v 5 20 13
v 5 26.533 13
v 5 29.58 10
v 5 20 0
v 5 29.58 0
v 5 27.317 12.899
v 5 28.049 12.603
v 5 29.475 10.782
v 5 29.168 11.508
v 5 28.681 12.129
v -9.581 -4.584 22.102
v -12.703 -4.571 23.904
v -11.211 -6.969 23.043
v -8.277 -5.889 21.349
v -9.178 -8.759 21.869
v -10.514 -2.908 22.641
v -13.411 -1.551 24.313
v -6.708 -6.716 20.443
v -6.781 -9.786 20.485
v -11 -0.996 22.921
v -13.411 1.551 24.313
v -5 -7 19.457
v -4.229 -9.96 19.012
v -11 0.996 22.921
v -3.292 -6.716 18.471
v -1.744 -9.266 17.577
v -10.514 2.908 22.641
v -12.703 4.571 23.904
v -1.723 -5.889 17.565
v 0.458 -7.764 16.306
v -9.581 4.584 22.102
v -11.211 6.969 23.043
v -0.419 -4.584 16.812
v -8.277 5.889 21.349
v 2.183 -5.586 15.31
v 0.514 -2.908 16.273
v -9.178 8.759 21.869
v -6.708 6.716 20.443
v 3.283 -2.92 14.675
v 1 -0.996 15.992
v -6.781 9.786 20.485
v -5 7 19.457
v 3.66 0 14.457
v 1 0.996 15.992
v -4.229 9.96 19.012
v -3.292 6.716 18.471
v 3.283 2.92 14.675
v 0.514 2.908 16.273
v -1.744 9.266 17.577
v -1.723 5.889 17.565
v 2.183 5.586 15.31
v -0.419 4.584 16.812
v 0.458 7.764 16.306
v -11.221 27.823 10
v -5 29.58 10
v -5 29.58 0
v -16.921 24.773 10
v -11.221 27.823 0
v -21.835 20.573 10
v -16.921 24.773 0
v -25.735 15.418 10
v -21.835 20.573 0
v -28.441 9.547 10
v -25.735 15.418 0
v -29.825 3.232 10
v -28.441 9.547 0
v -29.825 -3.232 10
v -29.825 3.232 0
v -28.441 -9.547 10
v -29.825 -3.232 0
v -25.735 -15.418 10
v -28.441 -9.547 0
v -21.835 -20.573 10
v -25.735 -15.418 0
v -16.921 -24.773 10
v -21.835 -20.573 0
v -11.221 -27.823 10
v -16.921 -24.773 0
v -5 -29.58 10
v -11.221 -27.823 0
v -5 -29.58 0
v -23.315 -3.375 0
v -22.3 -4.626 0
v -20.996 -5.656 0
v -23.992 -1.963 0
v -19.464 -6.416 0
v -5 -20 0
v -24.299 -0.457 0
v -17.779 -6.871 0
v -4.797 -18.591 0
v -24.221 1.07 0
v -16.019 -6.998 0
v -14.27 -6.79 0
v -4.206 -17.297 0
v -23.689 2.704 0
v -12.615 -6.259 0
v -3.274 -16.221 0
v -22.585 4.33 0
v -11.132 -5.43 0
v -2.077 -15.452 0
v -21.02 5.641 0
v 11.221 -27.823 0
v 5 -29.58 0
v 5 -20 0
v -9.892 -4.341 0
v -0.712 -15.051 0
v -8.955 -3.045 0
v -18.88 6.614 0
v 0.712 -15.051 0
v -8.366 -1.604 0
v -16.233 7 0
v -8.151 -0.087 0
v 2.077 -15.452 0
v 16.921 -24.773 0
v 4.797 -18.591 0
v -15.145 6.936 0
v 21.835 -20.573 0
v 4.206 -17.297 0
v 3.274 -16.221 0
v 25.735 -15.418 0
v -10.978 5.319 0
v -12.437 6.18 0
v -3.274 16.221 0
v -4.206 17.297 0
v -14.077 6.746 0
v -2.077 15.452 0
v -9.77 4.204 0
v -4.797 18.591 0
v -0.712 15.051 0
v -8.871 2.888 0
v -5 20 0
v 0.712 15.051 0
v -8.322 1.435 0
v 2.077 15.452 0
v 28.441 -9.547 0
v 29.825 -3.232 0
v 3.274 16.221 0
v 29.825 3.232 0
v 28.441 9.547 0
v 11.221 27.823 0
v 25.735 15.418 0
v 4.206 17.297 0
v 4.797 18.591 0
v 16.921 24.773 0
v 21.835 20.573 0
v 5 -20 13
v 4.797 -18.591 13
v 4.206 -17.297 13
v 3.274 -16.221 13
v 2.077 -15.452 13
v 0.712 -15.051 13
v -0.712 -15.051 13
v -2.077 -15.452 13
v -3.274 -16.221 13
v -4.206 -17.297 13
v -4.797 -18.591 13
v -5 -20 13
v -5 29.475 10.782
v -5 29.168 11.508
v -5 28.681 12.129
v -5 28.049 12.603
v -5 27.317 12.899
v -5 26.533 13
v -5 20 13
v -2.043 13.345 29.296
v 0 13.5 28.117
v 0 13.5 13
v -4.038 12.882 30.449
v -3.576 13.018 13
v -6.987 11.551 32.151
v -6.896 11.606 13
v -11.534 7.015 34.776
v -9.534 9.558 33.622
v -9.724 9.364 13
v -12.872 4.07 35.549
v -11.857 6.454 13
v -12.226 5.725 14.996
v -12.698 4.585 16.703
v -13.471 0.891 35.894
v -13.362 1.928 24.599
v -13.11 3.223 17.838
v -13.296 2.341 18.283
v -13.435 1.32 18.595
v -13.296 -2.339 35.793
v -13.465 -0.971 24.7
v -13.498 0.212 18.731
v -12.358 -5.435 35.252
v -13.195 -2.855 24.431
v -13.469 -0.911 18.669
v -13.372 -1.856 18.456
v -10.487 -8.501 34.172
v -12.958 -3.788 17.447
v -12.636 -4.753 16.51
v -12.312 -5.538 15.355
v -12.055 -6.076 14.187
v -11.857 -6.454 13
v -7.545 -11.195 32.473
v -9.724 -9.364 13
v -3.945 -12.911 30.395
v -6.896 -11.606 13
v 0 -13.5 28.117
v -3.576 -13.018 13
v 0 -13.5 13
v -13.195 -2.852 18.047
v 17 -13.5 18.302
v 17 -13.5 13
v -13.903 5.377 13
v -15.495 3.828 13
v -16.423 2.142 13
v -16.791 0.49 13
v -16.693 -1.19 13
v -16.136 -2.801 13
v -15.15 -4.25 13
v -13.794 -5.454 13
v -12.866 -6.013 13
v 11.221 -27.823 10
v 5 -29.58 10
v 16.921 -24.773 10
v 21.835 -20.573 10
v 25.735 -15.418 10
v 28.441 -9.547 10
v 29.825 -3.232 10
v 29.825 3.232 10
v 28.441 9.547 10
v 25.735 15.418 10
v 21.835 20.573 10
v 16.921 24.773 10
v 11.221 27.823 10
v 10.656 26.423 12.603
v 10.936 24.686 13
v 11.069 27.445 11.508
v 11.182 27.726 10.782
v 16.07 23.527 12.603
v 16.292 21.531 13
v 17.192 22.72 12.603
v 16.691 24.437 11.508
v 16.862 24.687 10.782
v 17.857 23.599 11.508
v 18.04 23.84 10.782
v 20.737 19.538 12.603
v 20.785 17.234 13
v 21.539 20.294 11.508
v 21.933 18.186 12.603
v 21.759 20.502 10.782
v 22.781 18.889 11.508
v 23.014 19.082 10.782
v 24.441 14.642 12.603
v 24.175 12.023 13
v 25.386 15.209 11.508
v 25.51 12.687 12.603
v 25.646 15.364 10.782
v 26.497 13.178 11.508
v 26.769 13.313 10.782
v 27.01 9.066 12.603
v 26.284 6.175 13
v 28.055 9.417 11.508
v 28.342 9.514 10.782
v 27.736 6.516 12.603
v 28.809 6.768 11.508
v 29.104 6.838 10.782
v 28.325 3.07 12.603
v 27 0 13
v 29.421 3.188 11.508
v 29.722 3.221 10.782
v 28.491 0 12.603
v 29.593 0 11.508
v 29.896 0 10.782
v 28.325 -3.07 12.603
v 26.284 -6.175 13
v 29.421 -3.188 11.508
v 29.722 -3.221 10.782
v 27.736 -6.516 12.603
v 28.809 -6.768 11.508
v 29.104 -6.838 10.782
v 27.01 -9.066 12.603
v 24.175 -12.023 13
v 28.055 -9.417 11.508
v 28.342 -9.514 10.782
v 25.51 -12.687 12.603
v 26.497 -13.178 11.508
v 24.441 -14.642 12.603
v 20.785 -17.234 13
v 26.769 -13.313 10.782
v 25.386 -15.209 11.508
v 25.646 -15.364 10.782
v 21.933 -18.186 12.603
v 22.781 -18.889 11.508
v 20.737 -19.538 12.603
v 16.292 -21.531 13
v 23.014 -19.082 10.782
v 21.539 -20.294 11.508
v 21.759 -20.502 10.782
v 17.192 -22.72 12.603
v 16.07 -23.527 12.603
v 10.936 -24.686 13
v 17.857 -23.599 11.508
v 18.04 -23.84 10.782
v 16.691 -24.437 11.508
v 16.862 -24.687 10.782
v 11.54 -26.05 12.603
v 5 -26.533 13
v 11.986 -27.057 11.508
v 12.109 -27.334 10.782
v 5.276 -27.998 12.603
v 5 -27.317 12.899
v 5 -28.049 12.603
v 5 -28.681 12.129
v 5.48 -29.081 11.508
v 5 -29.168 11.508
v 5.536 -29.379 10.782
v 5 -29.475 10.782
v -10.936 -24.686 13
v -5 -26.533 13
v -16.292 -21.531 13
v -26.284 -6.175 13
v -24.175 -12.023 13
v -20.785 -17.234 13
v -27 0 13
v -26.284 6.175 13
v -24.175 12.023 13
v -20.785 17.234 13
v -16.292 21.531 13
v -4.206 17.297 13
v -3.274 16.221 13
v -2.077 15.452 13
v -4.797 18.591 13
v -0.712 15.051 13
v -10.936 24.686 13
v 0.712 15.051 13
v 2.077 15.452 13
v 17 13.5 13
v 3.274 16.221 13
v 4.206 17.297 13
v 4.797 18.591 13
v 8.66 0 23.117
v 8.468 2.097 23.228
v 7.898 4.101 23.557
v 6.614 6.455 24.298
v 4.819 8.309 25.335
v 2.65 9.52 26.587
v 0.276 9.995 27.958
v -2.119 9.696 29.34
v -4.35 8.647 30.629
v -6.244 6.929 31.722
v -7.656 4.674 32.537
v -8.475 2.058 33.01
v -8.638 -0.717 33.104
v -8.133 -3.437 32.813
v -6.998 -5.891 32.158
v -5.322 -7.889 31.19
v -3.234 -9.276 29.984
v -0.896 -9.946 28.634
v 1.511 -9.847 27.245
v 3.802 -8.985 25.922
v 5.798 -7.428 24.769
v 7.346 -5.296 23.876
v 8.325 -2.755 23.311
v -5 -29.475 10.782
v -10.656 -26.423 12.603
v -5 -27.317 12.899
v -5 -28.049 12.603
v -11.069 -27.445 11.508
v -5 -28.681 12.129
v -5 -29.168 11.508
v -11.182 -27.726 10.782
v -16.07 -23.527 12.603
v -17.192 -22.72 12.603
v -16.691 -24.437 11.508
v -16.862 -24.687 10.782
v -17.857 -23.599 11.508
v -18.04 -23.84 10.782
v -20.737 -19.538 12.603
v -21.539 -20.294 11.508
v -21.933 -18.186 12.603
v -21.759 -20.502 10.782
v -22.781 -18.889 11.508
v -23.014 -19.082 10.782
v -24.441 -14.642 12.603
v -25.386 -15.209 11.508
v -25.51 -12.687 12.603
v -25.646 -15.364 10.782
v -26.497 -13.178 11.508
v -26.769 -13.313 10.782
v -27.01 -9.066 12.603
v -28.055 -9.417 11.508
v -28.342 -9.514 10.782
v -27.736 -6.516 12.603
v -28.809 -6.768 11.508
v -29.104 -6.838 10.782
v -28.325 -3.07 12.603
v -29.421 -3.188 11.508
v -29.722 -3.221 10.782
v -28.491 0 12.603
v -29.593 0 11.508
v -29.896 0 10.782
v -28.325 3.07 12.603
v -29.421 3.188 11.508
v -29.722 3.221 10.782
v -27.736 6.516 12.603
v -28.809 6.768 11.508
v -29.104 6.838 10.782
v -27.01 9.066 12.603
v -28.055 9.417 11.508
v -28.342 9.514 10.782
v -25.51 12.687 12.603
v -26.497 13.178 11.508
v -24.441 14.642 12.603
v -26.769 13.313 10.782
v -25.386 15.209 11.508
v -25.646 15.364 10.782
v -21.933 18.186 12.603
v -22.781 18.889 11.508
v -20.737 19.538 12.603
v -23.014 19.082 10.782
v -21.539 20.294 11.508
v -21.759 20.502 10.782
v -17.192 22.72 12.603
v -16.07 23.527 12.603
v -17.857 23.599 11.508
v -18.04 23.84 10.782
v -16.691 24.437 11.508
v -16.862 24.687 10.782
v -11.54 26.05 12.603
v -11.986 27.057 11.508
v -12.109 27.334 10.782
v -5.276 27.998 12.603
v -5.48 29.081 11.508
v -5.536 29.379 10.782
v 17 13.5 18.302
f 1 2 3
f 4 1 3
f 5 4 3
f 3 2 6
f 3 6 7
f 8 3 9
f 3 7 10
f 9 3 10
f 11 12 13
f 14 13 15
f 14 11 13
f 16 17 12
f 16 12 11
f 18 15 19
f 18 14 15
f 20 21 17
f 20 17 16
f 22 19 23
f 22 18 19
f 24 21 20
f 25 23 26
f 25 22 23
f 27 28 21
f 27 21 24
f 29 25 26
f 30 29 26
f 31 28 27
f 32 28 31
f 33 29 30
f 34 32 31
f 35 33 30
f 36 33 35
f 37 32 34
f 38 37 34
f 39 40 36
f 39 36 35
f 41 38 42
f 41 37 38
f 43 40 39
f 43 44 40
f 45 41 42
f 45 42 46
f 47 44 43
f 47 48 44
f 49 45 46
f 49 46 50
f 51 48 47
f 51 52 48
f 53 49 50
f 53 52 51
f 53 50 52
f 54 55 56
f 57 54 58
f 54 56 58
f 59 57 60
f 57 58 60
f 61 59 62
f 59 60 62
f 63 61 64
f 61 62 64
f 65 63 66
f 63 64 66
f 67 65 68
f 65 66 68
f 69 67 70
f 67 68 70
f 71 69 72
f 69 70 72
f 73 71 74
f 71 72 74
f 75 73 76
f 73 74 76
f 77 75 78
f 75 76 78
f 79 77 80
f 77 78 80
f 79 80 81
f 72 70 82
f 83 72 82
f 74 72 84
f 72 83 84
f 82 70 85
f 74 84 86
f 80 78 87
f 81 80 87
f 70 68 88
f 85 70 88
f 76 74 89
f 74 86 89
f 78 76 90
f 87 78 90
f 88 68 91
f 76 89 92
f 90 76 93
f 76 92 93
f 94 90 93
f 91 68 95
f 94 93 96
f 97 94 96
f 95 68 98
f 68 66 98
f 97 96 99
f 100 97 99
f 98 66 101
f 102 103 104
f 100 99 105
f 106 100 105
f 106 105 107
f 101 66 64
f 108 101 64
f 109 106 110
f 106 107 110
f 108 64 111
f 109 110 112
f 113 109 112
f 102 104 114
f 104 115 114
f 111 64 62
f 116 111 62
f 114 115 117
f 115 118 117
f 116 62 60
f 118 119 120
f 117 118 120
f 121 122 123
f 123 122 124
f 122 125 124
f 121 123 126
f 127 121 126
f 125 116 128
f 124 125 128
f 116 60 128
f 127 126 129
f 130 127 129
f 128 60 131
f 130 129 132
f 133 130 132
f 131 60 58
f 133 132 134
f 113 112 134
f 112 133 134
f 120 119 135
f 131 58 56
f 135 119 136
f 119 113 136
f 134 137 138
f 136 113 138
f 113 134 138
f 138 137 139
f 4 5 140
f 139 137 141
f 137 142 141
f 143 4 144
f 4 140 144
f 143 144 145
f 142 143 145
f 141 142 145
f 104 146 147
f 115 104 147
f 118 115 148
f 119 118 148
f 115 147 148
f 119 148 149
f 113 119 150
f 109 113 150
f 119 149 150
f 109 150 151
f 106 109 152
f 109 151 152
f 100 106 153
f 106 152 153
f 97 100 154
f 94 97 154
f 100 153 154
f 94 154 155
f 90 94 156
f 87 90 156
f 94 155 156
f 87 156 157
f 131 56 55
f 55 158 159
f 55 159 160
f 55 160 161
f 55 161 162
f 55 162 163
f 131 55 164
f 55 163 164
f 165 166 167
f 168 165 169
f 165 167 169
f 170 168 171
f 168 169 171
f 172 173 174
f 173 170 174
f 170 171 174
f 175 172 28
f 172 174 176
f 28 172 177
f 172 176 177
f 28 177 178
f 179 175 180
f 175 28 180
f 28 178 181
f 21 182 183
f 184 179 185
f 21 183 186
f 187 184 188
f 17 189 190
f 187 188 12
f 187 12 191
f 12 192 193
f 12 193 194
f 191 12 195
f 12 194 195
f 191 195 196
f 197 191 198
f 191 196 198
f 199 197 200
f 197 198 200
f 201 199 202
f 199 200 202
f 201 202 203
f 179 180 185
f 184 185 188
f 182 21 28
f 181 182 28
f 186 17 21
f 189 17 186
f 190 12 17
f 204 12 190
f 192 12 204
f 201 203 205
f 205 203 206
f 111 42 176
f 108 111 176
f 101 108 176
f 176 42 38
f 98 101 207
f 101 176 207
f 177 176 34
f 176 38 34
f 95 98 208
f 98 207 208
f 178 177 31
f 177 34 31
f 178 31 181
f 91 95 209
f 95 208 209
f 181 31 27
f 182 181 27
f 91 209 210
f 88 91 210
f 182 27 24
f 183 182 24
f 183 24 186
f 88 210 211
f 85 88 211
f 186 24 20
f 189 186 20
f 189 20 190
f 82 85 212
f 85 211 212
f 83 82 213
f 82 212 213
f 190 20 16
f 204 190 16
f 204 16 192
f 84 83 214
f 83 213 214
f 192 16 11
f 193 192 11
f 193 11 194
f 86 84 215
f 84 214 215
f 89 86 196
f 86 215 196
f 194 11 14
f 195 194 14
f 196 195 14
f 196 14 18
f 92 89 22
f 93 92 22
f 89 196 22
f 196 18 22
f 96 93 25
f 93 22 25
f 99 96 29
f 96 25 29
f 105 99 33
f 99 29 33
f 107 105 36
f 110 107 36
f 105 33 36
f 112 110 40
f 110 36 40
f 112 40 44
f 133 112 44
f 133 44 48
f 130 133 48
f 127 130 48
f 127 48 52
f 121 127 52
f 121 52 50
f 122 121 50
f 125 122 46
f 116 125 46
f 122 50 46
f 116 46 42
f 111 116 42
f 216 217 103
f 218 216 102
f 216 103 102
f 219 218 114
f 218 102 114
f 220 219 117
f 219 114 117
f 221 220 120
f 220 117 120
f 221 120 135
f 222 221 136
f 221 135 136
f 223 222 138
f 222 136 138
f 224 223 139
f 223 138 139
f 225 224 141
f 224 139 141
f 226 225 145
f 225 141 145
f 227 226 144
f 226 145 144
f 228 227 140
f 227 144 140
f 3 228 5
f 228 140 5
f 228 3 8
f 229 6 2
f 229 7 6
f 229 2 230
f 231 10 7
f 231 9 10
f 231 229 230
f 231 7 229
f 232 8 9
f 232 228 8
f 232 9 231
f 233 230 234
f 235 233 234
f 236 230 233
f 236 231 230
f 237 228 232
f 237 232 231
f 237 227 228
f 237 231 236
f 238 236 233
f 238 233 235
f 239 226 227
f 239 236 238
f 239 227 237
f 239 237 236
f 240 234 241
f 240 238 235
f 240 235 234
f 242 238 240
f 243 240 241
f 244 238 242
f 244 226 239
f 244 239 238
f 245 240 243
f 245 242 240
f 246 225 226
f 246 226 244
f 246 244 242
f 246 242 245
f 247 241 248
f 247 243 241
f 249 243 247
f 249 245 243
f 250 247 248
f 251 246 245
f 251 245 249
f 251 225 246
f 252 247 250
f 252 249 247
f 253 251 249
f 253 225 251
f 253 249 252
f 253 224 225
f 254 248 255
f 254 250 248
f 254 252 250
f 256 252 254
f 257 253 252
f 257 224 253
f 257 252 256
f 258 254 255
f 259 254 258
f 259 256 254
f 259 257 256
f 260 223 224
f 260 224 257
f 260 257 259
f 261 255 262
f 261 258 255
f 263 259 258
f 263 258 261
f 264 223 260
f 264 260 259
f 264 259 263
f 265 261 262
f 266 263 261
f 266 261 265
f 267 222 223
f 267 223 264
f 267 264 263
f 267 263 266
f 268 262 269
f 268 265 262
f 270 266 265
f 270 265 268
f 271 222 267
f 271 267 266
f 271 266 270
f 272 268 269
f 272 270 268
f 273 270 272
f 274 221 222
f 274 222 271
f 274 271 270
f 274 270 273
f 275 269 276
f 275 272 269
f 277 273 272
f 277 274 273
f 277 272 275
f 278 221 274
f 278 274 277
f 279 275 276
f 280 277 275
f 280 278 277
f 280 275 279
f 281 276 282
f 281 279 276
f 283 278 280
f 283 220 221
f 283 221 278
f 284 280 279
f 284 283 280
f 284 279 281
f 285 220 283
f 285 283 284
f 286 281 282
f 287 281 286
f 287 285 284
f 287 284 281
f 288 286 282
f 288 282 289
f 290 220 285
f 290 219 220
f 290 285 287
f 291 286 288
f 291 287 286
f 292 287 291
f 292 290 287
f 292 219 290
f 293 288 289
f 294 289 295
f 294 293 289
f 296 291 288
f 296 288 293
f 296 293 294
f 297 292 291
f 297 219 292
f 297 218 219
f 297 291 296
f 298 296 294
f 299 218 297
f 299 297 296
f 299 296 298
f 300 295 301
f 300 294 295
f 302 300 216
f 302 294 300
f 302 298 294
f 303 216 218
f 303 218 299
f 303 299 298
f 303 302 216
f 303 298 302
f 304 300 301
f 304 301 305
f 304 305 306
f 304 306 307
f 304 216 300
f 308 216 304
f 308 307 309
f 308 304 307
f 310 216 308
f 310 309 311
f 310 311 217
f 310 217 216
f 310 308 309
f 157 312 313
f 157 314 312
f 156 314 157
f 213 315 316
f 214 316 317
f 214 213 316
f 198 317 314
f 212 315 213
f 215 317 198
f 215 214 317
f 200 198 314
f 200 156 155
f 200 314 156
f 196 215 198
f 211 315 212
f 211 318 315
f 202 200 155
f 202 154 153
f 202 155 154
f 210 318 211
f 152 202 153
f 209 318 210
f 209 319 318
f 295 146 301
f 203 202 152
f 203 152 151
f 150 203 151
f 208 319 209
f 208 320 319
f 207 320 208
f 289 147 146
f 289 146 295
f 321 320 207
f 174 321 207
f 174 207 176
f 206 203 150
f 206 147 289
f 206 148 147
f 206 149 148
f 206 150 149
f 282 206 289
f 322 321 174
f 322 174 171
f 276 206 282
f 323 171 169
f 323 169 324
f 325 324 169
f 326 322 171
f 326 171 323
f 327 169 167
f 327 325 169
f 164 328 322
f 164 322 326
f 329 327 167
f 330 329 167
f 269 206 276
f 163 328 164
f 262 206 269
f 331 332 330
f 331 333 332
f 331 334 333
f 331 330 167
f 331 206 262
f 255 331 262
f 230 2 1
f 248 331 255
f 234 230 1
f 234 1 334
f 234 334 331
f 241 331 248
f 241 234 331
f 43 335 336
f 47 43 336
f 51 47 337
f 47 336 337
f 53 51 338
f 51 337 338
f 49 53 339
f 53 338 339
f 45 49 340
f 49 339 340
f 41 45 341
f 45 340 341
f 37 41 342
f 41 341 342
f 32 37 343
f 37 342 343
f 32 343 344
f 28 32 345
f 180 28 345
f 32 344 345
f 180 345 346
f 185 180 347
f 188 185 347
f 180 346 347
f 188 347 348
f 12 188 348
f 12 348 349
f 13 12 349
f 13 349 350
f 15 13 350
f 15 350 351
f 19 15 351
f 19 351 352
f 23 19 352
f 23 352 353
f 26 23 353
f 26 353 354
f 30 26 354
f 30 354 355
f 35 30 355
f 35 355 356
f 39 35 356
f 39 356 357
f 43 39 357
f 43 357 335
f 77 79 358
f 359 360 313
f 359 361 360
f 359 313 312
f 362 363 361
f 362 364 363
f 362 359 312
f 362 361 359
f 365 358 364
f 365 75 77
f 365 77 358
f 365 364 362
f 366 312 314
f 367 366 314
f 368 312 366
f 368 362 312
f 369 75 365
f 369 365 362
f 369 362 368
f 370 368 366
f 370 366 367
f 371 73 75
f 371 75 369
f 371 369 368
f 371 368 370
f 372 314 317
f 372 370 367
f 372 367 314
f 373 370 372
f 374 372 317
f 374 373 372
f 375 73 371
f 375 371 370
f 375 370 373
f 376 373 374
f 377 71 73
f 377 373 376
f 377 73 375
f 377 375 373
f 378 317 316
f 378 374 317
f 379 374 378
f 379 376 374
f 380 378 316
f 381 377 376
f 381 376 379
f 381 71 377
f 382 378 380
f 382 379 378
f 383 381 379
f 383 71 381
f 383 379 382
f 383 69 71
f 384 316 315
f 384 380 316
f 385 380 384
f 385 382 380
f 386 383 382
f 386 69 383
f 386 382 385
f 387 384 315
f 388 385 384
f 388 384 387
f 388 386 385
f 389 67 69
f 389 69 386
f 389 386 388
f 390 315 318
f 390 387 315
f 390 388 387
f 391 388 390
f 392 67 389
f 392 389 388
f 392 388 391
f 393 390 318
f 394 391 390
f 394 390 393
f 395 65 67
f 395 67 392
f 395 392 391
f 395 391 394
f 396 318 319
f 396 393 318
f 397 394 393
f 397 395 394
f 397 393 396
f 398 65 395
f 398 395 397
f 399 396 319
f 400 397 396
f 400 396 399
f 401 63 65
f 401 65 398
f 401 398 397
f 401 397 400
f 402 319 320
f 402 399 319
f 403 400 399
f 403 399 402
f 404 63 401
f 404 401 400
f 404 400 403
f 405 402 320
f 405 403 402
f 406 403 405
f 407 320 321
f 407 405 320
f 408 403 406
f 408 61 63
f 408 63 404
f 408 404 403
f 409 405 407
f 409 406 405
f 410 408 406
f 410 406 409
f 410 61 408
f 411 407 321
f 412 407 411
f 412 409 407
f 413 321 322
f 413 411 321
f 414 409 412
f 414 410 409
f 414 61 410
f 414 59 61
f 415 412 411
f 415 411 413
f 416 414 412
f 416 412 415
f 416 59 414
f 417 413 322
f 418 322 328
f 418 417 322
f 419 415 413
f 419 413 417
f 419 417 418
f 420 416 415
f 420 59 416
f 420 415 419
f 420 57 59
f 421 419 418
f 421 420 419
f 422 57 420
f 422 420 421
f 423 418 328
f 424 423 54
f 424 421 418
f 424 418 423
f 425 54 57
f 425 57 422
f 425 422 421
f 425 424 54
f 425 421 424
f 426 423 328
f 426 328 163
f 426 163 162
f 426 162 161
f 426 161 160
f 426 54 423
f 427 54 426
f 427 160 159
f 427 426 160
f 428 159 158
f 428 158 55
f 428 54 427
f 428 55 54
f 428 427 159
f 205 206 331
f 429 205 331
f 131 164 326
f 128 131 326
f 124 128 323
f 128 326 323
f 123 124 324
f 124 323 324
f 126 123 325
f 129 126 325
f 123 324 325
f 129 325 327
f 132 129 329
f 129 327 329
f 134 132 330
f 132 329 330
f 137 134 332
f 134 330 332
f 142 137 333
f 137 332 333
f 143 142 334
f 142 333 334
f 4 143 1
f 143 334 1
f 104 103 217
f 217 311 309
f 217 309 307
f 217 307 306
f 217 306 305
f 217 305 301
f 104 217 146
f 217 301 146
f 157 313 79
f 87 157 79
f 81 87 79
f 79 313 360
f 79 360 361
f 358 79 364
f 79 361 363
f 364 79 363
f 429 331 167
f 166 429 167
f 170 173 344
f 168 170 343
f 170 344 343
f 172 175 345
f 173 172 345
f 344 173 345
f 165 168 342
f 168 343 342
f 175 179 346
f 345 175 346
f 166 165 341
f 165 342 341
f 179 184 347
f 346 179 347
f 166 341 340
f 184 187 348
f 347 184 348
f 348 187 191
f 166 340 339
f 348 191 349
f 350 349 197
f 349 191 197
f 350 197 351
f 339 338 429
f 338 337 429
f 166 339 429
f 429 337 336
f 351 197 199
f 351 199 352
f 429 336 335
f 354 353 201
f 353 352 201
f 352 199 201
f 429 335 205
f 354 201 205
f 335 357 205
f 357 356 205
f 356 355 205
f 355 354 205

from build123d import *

# Parameters (mm, degrees)
F0_R       = 30
F1_DEPTH   = 13
F3_DEPTH   = 25
F5_DEPTH   = 25
F7_DEPTH   = 25
F9_DEPTH   = 25
F10_R      = 10
F10_R_2    = 7
F11_DEPTH  = 10
F11_FACE_R = 7
F12_DEPTH  = 39.351137
F13_R      = 3
F14_R      = 3


with BuildPart() as f1:
    # F0 (on Top) → F1 (new body)
    with BuildSketch(Plane.XY):
        Circle(F0_R)
    extrude(amount=F1_DEPTH)

    # F2 (on face) → F3 (cut)
    with BuildSketch(Plane.XY.offset(13)):
        with BuildLine():
            Line((5, -29.580399), (5, -20))
            ThreePointArc((5, -20), (0, -25), (-5, -20))
            Line((-5, -20), (-5, -29.580399))
            ThreePointArc((-5, -29.580399), (0, -30), (5, -29.580399))
        make_face()
        with BuildLine():
            ThreePointArc((-5, -20), (0, -25), (5, -20))
            ThreePointArc((5, -20), (0, -15), (-5, -20))
        make_face()
    extrude(amount=-F3_DEPTH, mode=Mode.SUBTRACT)

    # F4 (on face) → F5 (cut)
    with BuildSketch(Plane.XY.offset(13)):
        with BuildLine():
            ThreePointArc((-5, 20), (0, 15), (5, 20))
            ThreePointArc((5, 20), (0, 25), (-5, 20))
        make_face()
        with BuildLine():
            ThreePointArc((-5, 20), (0, 25), (5, 20))
            Line((5, 20), (5, 29.580399))
            ThreePointArc((5, 29.580399), (0, 30), (-5, 29.580399))
            Line((-5, 29.580399), (-5, 20))
        make_face()
    extrude(amount=-F5_DEPTH, mode=Mode.SUBTRACT)

    # F6 (on face) → F7 (join)
    with BuildSketch(Plane.XY.offset(13)):
        with BuildLine():
            ThreePointArc((0, -13.5), (9.545942, -9.545942), (13.5, 0))
            ThreePointArc((13.5, 0), (9.545942, 9.545942), (0, 13.5))
            ThreePointArc((0, 13.5), (-13.5, 0), (0, -13.5))
        make_face()
        with BuildLine():
            ThreePointArc((0, 13.5), (9.545942, 9.545942), (13.5, 0))
            ThreePointArc((13.5, 0), (9.545942, -9.545942), (0, -13.5))
            Line((0, -13.5), (17, -13.5))
            Line((17, -13.5), (17, 13.5))
            Line((17, 13.5), (0, 13.5))
        make_face()
    extrude(amount=F7_DEPTH)

    # F8 (on Front) → F9 (cut, symmetric)
    with BuildSketch(Plane.XZ):
        Polygon((-14.918525, 36.73033), (17, 18.302161), (17, 39.234225), (-14.918525, 39.234225), align=None)
    extrude(amount=F9_DEPTH, both=True, mode=Mode.SUBTRACT)

    # F10 (on face) → F11 (cut)
    with BuildSketch(Plane(origin=(12.175068, 0, 21.087837), x_dir=(0.866025, 0, -0.5), z_dir=(0.5, 0, 0.866025))):
        with Locations((-14.058558, 0)):
            Circle(F10_R)
        with Locations((-14.058558, 0)):
            Circle(F10_R_2, mode=Mode.SUBTRACT)
    extrude(amount=-F11_DEPTH, mode=Mode.SUBTRACT)

    # F11_face (on face) → F12 (cut, through all)
    with BuildSketch(Plane(origin=(0, 0, 28.117116), x_dir=(0, 1, 0), z_dir=(0.5, 0, 0.866025))):
        Circle(F11_FACE_R)
    extrude(amount=-F12_DEPTH, mode=Mode.SUBTRACT)

    # F13
    f13_edges = [f1.edges().sort_by_distance(p)[0] for p in [
        (-30, 0, 13),
    ]]
    fillet(f13_edges, radius=F13_R)

    # F14
    f14_edges = [f1.edges().sort_by_distance(p)[0] for p in [
        (30, 0, 13),
    ]]
    fillet(f14_edges, radius=F14_R)


solid = f1.part
